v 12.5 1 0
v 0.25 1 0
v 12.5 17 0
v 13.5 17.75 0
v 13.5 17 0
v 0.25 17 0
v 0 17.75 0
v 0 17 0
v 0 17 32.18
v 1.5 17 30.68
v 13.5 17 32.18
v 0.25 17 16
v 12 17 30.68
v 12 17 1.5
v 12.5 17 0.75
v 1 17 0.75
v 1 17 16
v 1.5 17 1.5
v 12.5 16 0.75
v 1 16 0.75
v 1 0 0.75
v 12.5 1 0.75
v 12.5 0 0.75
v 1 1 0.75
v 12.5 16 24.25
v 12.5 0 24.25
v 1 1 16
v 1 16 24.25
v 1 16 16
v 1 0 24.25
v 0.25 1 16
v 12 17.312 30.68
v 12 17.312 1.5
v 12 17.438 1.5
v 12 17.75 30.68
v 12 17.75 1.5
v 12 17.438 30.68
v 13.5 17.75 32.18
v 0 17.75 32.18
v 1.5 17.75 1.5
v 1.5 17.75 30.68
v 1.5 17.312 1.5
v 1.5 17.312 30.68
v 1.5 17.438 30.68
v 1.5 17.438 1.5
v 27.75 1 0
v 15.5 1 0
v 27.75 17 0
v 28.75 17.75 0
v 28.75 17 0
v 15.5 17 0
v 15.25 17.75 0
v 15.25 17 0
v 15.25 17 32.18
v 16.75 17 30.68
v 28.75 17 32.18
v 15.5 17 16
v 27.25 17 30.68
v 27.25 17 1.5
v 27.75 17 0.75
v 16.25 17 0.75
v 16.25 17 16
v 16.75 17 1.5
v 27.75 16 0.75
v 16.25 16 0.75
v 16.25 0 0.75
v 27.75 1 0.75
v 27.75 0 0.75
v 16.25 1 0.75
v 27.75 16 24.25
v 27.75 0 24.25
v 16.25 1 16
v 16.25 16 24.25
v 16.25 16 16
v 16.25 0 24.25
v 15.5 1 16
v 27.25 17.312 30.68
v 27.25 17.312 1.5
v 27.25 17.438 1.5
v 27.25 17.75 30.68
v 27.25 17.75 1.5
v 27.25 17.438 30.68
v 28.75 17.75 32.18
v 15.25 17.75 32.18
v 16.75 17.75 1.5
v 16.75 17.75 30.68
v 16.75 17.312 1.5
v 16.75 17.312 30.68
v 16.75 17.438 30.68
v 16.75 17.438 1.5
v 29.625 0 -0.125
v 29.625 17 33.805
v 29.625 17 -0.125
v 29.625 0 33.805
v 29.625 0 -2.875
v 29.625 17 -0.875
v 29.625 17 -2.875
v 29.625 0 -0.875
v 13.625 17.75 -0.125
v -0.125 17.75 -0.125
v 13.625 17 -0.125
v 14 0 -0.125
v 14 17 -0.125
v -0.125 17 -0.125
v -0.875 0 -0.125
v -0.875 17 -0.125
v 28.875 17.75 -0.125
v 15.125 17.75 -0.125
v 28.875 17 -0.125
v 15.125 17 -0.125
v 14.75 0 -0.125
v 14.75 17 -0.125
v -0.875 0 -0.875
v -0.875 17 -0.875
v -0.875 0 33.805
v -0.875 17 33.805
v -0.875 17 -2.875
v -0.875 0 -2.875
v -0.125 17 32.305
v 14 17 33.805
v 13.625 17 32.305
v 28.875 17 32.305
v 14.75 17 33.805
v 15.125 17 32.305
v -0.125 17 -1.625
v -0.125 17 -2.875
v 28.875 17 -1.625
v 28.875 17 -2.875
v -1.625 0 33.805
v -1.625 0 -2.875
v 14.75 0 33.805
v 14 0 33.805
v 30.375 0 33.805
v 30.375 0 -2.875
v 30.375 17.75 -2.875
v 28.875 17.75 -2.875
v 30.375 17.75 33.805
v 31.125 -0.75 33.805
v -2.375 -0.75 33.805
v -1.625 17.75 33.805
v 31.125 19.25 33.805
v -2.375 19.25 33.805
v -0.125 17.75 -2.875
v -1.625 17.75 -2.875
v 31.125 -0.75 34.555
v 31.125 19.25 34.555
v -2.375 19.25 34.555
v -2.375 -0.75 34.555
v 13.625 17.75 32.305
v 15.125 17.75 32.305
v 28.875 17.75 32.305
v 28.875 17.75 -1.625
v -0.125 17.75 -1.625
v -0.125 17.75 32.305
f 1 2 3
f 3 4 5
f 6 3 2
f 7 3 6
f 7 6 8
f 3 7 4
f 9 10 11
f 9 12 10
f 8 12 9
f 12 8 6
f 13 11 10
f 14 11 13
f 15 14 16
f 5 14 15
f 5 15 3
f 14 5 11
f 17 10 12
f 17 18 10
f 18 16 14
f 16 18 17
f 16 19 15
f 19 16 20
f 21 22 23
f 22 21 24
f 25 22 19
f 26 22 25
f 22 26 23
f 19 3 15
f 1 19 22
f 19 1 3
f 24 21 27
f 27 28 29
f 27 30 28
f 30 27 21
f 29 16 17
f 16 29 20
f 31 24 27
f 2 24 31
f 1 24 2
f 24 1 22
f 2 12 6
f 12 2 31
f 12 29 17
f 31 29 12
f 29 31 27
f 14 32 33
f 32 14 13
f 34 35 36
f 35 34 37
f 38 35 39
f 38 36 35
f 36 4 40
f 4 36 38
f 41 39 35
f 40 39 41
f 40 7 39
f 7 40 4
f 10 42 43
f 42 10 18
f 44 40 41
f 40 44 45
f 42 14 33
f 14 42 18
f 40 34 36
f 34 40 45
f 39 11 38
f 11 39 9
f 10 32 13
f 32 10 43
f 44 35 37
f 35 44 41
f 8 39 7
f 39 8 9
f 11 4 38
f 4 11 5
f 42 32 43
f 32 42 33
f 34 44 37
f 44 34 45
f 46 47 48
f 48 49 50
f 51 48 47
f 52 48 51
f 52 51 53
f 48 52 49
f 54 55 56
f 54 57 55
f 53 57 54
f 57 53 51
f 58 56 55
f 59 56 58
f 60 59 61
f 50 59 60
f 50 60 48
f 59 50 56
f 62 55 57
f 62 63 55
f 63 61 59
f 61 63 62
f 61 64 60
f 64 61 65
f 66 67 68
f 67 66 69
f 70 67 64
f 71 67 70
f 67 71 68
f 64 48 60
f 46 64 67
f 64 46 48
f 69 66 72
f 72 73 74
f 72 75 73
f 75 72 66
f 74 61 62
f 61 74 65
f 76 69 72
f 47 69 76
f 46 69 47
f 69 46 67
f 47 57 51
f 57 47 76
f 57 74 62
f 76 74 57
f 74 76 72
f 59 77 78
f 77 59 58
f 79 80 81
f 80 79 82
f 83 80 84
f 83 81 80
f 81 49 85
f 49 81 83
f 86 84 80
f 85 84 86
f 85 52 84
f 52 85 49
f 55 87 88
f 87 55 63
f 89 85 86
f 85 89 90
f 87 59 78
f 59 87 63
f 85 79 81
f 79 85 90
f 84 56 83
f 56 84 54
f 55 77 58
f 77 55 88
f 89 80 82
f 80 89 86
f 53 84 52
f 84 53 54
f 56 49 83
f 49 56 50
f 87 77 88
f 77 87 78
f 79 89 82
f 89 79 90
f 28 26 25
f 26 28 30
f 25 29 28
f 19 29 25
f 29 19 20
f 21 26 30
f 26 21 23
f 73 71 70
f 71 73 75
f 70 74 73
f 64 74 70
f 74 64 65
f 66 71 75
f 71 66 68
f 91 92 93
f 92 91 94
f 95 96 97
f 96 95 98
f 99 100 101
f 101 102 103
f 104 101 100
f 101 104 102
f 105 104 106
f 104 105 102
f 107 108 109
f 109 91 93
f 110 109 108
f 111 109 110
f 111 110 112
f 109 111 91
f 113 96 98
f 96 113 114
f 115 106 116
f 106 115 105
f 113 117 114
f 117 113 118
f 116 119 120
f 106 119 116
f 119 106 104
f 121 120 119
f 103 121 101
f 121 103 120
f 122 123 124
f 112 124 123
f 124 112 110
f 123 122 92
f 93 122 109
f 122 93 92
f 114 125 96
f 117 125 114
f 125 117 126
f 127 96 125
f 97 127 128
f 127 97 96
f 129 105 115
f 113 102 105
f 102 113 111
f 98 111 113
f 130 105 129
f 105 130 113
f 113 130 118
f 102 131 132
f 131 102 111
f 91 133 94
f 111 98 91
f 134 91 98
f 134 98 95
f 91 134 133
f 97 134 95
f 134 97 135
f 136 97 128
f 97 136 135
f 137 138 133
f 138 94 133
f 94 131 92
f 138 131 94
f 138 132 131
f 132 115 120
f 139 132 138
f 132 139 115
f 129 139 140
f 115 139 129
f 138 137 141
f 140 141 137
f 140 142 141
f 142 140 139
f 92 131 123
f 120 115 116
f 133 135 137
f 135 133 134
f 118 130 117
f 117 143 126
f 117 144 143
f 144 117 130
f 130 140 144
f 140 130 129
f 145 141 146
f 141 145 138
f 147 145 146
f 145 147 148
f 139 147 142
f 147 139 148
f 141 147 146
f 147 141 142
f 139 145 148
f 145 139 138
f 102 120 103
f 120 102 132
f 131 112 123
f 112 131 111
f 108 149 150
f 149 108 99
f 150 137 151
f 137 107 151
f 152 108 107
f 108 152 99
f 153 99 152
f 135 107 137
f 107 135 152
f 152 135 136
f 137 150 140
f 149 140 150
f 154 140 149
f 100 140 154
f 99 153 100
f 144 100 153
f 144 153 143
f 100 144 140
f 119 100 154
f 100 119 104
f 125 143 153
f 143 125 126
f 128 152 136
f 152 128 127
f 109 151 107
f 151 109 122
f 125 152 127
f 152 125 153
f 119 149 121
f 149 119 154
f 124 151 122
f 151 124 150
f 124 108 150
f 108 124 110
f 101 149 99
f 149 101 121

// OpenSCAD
module board( size, label = false ) {
    // size[0] is always with the grain.
    // size[1] is against the grain.
    // size[2] is the board thickness.
    
    cube( size = size );
    
    // Output the size of the board for easy cut lists.
    echo( str( size[2], " ", label, ": ", size[0], "x", size[1]));
}

width_of_can = 11.5;
height_of_can = 23.5;
depth_of_can = 16;
number_of_cans = 2;
bead_board_inset = 1/2;
bead_board_thickness = 1/8;
lid_overhang_front = 1.5;  // Overhang for the lid front
lid_overhang_sides = .75; // Overhang for the lid sides
lid_overhang_back = .75; // Overhang for the back of the lid.

toe_clearance = 2; // Space between the bottom board and the floor.
stock_thickness = 3/4;
cabinet_door_clearance = 1/8;

horizontal_can_clearance = 1;
vertical_can_clearance = 3;
depth_can_clearance = 1; // Space behind cans.

each_can_cabinet_door_width = width_of_can + horizontal_can_clearance + horizontal_can_clearance;

each_can_cabinet_door_height =
    stock_thickness // The base of the tilting door.
    + sqrt( ( height_of_can * height_of_can ) + ( depth_of_can * depth_of_can ) ) // The longest diagonal across the can.
    + vertical_can_clearance // Extra space for clearance and garbage at the top.
    ;

face_frame_width = 1.5;
depth_of_box = depth_of_can + depth_can_clearance;

width_of_horizontal_base =
    (number_of_cans * ( each_can_cabinet_door_width + cabinet_door_clearance + cabinet_door_clearance ) ) // Space for doors and clearance.
    + ((number_of_cans + 1 ) * face_frame_width) // Space for the surrounding face frames
    - stock_thickness - stock_thickness // Minus the width of the end boards.
    ;

translate([0, depth_of_box+stock_thickness, 0]) rotate([-40 * $t, 0, 0]) translate([0, -depth_of_box-stock_thickness, 0]) union() {
    color( "white" ) {
    translate([0, depth_of_box + stock_thickness, 0])
    for (can_number=[0:number_of_cans-1]){
        // Cabinet doors.
        translate([
            ( can_number * ( each_can_cabinet_door_width + cabinet_door_clearance + face_frame_width + cabinet_door_clearance ) ),
            0,
            0
         ])
            rotate([90, 0, 0])
            union() {
                    // Base that holds the can.
        translate([width_of_can + ((each_can_cabinet_door_width - width_of_can) / 2), stock_thickness, stock_thickness]) 
            rotate([0, -90, 90])
            board( [ depth_of_can, width_of_can, stock_thickness], "can base" );
           
                // Base sides
                translate([((each_can_cabinet_door_width - width_of_can) / 2), 0, stock_thickness]) rotate([0, -90, 0]) board( [ depth_of_can, depth_of_box - depth_can_clearance, stock_thickness ], "can sides (combined)" );
            
                // Bottom board.
                translate([face_frame_width, 0, 0])
                    board([ each_can_cabinet_door_width - (face_frame_width * 2), face_frame_width, stock_thickness], "door face frame" );
            
                // Top Board.
                translate([face_frame_width, each_can_cabinet_door_height - face_frame_width, 0])
                    board([ each_can_cabinet_door_width - (face_frame_width * 2), face_frame_width, stock_thickness], "door face frame" );
            
                // Left board.
                translate([face_frame_width, 0, 0] )
                    rotate( [0, 0, 90 ] )
                    board( [ each_can_cabinet_door_height, face_frame_width, stock_thickness ], "door face frame" );
            
                // Right board.
                translate([each_can_cabinet_door_width, 0, 0] )
                    rotate( [0, 0, 90 ] )
                    board( [ each_can_cabinet_door_height, face_frame_width, stock_thickness ], "door face frame" );
            
                // Inset.
                color( "white" ) translate([each_can_cabinet_door_width - face_frame_width + bead_board_inset, face_frame_width - bead_board_inset, ( (stock_thickness - bead_board_thickness ) / 2) ])
                    rotate([0, 0, 90])
                    board([ each_can_cabinet_door_height + ( bead_board_inset * 2 ) - face_frame_width - face_frame_width, each_can_cabinet_door_width + ( bead_board_inset * 2 ) - face_frame_width - face_frame_width, bead_board_thickness], "beadboard" );
    }
}}
    // Mock up the cans.
    color( "orange") for (can_number=[0:number_of_cans-1]) {
        translate([
            ((each_can_cabinet_door_width - width_of_can) / 2)
    
        + (can_number * (each_can_cabinet_door_width + cabinet_door_clearance + cabinet_door_clearance + face_frame_width ) )
    
        ,
            0, stock_thickness
        ])
            cube([width_of_can, depth_of_can, height_of_can]);
    }

}{

// Bottom support board.
color( "white" ) translate([
    -cabinet_door_clearance + stock_thickness - face_frame_width,
    0,
    -stock_thickness - cabinet_door_clearance
    ])
    board( [ width_of_horizontal_base, depth_of_box, stock_thickness ], "box frame (bottom)" );

// Near side.
color( "white" ) translate( [ stock_thickness - cabinet_door_clearance - face_frame_width + width_of_horizontal_base + stock_thickness, 0, -toe_clearance - stock_thickness - cabinet_door_clearance ] )
rotate( [ 0, -90, 0 ] )
    board( [
        toe_clearance + stock_thickness + cabinet_door_clearance + each_can_cabinet_door_height + cabinet_door_clearance + face_frame_width,
        depth_of_box,
        stock_thickness
    ], "box frame" );

// Far side
color( "white" ) translate( [ -cabinet_door_clearance + stock_thickness - face_frame_width, 0, -toe_clearance - stock_thickness - cabinet_door_clearance ] )
rotate( [ 0, -90, 0 ] )
    board( [
        toe_clearance + stock_thickness + cabinet_door_clearance + each_can_cabinet_door_height + cabinet_door_clearance + face_frame_width,
        depth_of_box,
        stock_thickness
    ], "box frame" );

// Top
color( "tan" ) translate([
    -(face_frame_width - stock_thickness) - stock_thickness - lid_overhang_sides - cabinet_door_clearance,
    -lid_overhang_back,
    -stock_thickness - cabinet_door_clearance + cabinet_door_clearance + each_can_cabinet_door_height + cabinet_door_clearance + stock_thickness + face_frame_width
    ])
    board( [ width_of_horizontal_base + stock_thickness + stock_thickness + lid_overhang_sides + lid_overhang_sides, depth_of_box + lid_overhang_front + lid_overhang_back + stock_thickness, stock_thickness ], "box frame top" );
    
// Vertical dividers.
color( "white" ) for (can_number = [0:number_of_cans-2]) {
    translate([
        stock_thickness
        + each_can_cabinet_door_width
        - (stock_thickness/2)
        + ((face_frame_width + cabinet_door_clearance + cabinet_door_clearance)/2)
        // Everything above is to place the first one after the first door.
        // The rest is to shift every next divider over the equivalent number of full door widths.
        + ( 
            can_number *
            (
                each_can_cabinet_door_width
                + cabinet_door_clearance
                + cabinet_door_clearance
                + face_frame_width
            )
        )
        ,
        0,
        -cabinet_door_clearance])
    rotate([0, -90, 0])
        board( [ each_can_cabinet_door_height + cabinet_door_clearance + cabinet_door_clearance + face_frame_width, depth_of_box, stock_thickness ], "box frame (interior vertical)" );
}

// Face frame

// Near stile
color( "white" ) translate([-cabinet_door_clearance - face_frame_width, depth_of_box, -cabinet_door_clearance - stock_thickness - toe_clearance]) 
rotate([0, -90, -90])
    board([toe_clearance + stock_thickness + cabinet_door_clearance + each_can_cabinet_door_height + cabinet_door_clearance + face_frame_width, face_frame_width, stock_thickness], "face frame");

// Far stile
color( "white" ) translate([-cabinet_door_clearance - face_frame_width - ( face_frame_width - stock_thickness) + width_of_horizontal_base + stock_thickness, depth_of_box, -cabinet_door_clearance - stock_thickness - toe_clearance]) 
rotate([0, -90, -90])
    board([toe_clearance + stock_thickness + cabinet_door_clearance + each_can_cabinet_door_height + cabinet_door_clearance + face_frame_width, face_frame_width, stock_thickness], "face frame");

// Bottom rail
color( "white" ) translate([-cabinet_door_clearance, depth_of_box, -cabinet_door_clearance - face_frame_width])
    translate([0, stock_thickness, 0]) rotate([90, 0, 0]) board([width_of_horizontal_base - ((face_frame_width - stock_thickness) * 2), face_frame_width, stock_thickness], "face frame");

// Top rail
color( "white" ) translate([-cabinet_door_clearance, depth_of_box, -cabinet_door_clearance - face_frame_width + each_can_cabinet_door_height + cabinet_door_clearance + cabinet_door_clearance + face_frame_width])
    translate([0, stock_thickness, 0]) rotate([90, 0, 0]) board([width_of_horizontal_base - ((face_frame_width - stock_thickness) * 2), face_frame_width, stock_thickness], "face frame");

// Vertical stiles.
color( "white" ) for (can_number = [0:number_of_cans-2]) {
    translate([
        stock_thickness
        + each_can_cabinet_door_width
        - (stock_thickness/2)
        + ((face_frame_width + cabinet_door_clearance + cabinet_door_clearance)/2)
        - stock_thickness
        - ( ( face_frame_width - stock_thickness ) / 2 )
        // Everything above is to place the first one after the first door.
        // The rest is to shift every next divider over the equivalent number of full door widths.
        + ( 
            can_number *
            (
                each_can_cabinet_door_width
                + cabinet_door_clearance
                + cabinet_door_clearance
                + face_frame_width
            )
        )
        ,
        depth_of_box,
        -cabinet_door_clearance])
    rotate([0, -90, -90])
        board( [ each_can_cabinet_door_height + cabinet_door_clearance + cabinet_door_clearance, face_frame_width, stock_thickness ], "face frame (interior vertical)" );
}
}
